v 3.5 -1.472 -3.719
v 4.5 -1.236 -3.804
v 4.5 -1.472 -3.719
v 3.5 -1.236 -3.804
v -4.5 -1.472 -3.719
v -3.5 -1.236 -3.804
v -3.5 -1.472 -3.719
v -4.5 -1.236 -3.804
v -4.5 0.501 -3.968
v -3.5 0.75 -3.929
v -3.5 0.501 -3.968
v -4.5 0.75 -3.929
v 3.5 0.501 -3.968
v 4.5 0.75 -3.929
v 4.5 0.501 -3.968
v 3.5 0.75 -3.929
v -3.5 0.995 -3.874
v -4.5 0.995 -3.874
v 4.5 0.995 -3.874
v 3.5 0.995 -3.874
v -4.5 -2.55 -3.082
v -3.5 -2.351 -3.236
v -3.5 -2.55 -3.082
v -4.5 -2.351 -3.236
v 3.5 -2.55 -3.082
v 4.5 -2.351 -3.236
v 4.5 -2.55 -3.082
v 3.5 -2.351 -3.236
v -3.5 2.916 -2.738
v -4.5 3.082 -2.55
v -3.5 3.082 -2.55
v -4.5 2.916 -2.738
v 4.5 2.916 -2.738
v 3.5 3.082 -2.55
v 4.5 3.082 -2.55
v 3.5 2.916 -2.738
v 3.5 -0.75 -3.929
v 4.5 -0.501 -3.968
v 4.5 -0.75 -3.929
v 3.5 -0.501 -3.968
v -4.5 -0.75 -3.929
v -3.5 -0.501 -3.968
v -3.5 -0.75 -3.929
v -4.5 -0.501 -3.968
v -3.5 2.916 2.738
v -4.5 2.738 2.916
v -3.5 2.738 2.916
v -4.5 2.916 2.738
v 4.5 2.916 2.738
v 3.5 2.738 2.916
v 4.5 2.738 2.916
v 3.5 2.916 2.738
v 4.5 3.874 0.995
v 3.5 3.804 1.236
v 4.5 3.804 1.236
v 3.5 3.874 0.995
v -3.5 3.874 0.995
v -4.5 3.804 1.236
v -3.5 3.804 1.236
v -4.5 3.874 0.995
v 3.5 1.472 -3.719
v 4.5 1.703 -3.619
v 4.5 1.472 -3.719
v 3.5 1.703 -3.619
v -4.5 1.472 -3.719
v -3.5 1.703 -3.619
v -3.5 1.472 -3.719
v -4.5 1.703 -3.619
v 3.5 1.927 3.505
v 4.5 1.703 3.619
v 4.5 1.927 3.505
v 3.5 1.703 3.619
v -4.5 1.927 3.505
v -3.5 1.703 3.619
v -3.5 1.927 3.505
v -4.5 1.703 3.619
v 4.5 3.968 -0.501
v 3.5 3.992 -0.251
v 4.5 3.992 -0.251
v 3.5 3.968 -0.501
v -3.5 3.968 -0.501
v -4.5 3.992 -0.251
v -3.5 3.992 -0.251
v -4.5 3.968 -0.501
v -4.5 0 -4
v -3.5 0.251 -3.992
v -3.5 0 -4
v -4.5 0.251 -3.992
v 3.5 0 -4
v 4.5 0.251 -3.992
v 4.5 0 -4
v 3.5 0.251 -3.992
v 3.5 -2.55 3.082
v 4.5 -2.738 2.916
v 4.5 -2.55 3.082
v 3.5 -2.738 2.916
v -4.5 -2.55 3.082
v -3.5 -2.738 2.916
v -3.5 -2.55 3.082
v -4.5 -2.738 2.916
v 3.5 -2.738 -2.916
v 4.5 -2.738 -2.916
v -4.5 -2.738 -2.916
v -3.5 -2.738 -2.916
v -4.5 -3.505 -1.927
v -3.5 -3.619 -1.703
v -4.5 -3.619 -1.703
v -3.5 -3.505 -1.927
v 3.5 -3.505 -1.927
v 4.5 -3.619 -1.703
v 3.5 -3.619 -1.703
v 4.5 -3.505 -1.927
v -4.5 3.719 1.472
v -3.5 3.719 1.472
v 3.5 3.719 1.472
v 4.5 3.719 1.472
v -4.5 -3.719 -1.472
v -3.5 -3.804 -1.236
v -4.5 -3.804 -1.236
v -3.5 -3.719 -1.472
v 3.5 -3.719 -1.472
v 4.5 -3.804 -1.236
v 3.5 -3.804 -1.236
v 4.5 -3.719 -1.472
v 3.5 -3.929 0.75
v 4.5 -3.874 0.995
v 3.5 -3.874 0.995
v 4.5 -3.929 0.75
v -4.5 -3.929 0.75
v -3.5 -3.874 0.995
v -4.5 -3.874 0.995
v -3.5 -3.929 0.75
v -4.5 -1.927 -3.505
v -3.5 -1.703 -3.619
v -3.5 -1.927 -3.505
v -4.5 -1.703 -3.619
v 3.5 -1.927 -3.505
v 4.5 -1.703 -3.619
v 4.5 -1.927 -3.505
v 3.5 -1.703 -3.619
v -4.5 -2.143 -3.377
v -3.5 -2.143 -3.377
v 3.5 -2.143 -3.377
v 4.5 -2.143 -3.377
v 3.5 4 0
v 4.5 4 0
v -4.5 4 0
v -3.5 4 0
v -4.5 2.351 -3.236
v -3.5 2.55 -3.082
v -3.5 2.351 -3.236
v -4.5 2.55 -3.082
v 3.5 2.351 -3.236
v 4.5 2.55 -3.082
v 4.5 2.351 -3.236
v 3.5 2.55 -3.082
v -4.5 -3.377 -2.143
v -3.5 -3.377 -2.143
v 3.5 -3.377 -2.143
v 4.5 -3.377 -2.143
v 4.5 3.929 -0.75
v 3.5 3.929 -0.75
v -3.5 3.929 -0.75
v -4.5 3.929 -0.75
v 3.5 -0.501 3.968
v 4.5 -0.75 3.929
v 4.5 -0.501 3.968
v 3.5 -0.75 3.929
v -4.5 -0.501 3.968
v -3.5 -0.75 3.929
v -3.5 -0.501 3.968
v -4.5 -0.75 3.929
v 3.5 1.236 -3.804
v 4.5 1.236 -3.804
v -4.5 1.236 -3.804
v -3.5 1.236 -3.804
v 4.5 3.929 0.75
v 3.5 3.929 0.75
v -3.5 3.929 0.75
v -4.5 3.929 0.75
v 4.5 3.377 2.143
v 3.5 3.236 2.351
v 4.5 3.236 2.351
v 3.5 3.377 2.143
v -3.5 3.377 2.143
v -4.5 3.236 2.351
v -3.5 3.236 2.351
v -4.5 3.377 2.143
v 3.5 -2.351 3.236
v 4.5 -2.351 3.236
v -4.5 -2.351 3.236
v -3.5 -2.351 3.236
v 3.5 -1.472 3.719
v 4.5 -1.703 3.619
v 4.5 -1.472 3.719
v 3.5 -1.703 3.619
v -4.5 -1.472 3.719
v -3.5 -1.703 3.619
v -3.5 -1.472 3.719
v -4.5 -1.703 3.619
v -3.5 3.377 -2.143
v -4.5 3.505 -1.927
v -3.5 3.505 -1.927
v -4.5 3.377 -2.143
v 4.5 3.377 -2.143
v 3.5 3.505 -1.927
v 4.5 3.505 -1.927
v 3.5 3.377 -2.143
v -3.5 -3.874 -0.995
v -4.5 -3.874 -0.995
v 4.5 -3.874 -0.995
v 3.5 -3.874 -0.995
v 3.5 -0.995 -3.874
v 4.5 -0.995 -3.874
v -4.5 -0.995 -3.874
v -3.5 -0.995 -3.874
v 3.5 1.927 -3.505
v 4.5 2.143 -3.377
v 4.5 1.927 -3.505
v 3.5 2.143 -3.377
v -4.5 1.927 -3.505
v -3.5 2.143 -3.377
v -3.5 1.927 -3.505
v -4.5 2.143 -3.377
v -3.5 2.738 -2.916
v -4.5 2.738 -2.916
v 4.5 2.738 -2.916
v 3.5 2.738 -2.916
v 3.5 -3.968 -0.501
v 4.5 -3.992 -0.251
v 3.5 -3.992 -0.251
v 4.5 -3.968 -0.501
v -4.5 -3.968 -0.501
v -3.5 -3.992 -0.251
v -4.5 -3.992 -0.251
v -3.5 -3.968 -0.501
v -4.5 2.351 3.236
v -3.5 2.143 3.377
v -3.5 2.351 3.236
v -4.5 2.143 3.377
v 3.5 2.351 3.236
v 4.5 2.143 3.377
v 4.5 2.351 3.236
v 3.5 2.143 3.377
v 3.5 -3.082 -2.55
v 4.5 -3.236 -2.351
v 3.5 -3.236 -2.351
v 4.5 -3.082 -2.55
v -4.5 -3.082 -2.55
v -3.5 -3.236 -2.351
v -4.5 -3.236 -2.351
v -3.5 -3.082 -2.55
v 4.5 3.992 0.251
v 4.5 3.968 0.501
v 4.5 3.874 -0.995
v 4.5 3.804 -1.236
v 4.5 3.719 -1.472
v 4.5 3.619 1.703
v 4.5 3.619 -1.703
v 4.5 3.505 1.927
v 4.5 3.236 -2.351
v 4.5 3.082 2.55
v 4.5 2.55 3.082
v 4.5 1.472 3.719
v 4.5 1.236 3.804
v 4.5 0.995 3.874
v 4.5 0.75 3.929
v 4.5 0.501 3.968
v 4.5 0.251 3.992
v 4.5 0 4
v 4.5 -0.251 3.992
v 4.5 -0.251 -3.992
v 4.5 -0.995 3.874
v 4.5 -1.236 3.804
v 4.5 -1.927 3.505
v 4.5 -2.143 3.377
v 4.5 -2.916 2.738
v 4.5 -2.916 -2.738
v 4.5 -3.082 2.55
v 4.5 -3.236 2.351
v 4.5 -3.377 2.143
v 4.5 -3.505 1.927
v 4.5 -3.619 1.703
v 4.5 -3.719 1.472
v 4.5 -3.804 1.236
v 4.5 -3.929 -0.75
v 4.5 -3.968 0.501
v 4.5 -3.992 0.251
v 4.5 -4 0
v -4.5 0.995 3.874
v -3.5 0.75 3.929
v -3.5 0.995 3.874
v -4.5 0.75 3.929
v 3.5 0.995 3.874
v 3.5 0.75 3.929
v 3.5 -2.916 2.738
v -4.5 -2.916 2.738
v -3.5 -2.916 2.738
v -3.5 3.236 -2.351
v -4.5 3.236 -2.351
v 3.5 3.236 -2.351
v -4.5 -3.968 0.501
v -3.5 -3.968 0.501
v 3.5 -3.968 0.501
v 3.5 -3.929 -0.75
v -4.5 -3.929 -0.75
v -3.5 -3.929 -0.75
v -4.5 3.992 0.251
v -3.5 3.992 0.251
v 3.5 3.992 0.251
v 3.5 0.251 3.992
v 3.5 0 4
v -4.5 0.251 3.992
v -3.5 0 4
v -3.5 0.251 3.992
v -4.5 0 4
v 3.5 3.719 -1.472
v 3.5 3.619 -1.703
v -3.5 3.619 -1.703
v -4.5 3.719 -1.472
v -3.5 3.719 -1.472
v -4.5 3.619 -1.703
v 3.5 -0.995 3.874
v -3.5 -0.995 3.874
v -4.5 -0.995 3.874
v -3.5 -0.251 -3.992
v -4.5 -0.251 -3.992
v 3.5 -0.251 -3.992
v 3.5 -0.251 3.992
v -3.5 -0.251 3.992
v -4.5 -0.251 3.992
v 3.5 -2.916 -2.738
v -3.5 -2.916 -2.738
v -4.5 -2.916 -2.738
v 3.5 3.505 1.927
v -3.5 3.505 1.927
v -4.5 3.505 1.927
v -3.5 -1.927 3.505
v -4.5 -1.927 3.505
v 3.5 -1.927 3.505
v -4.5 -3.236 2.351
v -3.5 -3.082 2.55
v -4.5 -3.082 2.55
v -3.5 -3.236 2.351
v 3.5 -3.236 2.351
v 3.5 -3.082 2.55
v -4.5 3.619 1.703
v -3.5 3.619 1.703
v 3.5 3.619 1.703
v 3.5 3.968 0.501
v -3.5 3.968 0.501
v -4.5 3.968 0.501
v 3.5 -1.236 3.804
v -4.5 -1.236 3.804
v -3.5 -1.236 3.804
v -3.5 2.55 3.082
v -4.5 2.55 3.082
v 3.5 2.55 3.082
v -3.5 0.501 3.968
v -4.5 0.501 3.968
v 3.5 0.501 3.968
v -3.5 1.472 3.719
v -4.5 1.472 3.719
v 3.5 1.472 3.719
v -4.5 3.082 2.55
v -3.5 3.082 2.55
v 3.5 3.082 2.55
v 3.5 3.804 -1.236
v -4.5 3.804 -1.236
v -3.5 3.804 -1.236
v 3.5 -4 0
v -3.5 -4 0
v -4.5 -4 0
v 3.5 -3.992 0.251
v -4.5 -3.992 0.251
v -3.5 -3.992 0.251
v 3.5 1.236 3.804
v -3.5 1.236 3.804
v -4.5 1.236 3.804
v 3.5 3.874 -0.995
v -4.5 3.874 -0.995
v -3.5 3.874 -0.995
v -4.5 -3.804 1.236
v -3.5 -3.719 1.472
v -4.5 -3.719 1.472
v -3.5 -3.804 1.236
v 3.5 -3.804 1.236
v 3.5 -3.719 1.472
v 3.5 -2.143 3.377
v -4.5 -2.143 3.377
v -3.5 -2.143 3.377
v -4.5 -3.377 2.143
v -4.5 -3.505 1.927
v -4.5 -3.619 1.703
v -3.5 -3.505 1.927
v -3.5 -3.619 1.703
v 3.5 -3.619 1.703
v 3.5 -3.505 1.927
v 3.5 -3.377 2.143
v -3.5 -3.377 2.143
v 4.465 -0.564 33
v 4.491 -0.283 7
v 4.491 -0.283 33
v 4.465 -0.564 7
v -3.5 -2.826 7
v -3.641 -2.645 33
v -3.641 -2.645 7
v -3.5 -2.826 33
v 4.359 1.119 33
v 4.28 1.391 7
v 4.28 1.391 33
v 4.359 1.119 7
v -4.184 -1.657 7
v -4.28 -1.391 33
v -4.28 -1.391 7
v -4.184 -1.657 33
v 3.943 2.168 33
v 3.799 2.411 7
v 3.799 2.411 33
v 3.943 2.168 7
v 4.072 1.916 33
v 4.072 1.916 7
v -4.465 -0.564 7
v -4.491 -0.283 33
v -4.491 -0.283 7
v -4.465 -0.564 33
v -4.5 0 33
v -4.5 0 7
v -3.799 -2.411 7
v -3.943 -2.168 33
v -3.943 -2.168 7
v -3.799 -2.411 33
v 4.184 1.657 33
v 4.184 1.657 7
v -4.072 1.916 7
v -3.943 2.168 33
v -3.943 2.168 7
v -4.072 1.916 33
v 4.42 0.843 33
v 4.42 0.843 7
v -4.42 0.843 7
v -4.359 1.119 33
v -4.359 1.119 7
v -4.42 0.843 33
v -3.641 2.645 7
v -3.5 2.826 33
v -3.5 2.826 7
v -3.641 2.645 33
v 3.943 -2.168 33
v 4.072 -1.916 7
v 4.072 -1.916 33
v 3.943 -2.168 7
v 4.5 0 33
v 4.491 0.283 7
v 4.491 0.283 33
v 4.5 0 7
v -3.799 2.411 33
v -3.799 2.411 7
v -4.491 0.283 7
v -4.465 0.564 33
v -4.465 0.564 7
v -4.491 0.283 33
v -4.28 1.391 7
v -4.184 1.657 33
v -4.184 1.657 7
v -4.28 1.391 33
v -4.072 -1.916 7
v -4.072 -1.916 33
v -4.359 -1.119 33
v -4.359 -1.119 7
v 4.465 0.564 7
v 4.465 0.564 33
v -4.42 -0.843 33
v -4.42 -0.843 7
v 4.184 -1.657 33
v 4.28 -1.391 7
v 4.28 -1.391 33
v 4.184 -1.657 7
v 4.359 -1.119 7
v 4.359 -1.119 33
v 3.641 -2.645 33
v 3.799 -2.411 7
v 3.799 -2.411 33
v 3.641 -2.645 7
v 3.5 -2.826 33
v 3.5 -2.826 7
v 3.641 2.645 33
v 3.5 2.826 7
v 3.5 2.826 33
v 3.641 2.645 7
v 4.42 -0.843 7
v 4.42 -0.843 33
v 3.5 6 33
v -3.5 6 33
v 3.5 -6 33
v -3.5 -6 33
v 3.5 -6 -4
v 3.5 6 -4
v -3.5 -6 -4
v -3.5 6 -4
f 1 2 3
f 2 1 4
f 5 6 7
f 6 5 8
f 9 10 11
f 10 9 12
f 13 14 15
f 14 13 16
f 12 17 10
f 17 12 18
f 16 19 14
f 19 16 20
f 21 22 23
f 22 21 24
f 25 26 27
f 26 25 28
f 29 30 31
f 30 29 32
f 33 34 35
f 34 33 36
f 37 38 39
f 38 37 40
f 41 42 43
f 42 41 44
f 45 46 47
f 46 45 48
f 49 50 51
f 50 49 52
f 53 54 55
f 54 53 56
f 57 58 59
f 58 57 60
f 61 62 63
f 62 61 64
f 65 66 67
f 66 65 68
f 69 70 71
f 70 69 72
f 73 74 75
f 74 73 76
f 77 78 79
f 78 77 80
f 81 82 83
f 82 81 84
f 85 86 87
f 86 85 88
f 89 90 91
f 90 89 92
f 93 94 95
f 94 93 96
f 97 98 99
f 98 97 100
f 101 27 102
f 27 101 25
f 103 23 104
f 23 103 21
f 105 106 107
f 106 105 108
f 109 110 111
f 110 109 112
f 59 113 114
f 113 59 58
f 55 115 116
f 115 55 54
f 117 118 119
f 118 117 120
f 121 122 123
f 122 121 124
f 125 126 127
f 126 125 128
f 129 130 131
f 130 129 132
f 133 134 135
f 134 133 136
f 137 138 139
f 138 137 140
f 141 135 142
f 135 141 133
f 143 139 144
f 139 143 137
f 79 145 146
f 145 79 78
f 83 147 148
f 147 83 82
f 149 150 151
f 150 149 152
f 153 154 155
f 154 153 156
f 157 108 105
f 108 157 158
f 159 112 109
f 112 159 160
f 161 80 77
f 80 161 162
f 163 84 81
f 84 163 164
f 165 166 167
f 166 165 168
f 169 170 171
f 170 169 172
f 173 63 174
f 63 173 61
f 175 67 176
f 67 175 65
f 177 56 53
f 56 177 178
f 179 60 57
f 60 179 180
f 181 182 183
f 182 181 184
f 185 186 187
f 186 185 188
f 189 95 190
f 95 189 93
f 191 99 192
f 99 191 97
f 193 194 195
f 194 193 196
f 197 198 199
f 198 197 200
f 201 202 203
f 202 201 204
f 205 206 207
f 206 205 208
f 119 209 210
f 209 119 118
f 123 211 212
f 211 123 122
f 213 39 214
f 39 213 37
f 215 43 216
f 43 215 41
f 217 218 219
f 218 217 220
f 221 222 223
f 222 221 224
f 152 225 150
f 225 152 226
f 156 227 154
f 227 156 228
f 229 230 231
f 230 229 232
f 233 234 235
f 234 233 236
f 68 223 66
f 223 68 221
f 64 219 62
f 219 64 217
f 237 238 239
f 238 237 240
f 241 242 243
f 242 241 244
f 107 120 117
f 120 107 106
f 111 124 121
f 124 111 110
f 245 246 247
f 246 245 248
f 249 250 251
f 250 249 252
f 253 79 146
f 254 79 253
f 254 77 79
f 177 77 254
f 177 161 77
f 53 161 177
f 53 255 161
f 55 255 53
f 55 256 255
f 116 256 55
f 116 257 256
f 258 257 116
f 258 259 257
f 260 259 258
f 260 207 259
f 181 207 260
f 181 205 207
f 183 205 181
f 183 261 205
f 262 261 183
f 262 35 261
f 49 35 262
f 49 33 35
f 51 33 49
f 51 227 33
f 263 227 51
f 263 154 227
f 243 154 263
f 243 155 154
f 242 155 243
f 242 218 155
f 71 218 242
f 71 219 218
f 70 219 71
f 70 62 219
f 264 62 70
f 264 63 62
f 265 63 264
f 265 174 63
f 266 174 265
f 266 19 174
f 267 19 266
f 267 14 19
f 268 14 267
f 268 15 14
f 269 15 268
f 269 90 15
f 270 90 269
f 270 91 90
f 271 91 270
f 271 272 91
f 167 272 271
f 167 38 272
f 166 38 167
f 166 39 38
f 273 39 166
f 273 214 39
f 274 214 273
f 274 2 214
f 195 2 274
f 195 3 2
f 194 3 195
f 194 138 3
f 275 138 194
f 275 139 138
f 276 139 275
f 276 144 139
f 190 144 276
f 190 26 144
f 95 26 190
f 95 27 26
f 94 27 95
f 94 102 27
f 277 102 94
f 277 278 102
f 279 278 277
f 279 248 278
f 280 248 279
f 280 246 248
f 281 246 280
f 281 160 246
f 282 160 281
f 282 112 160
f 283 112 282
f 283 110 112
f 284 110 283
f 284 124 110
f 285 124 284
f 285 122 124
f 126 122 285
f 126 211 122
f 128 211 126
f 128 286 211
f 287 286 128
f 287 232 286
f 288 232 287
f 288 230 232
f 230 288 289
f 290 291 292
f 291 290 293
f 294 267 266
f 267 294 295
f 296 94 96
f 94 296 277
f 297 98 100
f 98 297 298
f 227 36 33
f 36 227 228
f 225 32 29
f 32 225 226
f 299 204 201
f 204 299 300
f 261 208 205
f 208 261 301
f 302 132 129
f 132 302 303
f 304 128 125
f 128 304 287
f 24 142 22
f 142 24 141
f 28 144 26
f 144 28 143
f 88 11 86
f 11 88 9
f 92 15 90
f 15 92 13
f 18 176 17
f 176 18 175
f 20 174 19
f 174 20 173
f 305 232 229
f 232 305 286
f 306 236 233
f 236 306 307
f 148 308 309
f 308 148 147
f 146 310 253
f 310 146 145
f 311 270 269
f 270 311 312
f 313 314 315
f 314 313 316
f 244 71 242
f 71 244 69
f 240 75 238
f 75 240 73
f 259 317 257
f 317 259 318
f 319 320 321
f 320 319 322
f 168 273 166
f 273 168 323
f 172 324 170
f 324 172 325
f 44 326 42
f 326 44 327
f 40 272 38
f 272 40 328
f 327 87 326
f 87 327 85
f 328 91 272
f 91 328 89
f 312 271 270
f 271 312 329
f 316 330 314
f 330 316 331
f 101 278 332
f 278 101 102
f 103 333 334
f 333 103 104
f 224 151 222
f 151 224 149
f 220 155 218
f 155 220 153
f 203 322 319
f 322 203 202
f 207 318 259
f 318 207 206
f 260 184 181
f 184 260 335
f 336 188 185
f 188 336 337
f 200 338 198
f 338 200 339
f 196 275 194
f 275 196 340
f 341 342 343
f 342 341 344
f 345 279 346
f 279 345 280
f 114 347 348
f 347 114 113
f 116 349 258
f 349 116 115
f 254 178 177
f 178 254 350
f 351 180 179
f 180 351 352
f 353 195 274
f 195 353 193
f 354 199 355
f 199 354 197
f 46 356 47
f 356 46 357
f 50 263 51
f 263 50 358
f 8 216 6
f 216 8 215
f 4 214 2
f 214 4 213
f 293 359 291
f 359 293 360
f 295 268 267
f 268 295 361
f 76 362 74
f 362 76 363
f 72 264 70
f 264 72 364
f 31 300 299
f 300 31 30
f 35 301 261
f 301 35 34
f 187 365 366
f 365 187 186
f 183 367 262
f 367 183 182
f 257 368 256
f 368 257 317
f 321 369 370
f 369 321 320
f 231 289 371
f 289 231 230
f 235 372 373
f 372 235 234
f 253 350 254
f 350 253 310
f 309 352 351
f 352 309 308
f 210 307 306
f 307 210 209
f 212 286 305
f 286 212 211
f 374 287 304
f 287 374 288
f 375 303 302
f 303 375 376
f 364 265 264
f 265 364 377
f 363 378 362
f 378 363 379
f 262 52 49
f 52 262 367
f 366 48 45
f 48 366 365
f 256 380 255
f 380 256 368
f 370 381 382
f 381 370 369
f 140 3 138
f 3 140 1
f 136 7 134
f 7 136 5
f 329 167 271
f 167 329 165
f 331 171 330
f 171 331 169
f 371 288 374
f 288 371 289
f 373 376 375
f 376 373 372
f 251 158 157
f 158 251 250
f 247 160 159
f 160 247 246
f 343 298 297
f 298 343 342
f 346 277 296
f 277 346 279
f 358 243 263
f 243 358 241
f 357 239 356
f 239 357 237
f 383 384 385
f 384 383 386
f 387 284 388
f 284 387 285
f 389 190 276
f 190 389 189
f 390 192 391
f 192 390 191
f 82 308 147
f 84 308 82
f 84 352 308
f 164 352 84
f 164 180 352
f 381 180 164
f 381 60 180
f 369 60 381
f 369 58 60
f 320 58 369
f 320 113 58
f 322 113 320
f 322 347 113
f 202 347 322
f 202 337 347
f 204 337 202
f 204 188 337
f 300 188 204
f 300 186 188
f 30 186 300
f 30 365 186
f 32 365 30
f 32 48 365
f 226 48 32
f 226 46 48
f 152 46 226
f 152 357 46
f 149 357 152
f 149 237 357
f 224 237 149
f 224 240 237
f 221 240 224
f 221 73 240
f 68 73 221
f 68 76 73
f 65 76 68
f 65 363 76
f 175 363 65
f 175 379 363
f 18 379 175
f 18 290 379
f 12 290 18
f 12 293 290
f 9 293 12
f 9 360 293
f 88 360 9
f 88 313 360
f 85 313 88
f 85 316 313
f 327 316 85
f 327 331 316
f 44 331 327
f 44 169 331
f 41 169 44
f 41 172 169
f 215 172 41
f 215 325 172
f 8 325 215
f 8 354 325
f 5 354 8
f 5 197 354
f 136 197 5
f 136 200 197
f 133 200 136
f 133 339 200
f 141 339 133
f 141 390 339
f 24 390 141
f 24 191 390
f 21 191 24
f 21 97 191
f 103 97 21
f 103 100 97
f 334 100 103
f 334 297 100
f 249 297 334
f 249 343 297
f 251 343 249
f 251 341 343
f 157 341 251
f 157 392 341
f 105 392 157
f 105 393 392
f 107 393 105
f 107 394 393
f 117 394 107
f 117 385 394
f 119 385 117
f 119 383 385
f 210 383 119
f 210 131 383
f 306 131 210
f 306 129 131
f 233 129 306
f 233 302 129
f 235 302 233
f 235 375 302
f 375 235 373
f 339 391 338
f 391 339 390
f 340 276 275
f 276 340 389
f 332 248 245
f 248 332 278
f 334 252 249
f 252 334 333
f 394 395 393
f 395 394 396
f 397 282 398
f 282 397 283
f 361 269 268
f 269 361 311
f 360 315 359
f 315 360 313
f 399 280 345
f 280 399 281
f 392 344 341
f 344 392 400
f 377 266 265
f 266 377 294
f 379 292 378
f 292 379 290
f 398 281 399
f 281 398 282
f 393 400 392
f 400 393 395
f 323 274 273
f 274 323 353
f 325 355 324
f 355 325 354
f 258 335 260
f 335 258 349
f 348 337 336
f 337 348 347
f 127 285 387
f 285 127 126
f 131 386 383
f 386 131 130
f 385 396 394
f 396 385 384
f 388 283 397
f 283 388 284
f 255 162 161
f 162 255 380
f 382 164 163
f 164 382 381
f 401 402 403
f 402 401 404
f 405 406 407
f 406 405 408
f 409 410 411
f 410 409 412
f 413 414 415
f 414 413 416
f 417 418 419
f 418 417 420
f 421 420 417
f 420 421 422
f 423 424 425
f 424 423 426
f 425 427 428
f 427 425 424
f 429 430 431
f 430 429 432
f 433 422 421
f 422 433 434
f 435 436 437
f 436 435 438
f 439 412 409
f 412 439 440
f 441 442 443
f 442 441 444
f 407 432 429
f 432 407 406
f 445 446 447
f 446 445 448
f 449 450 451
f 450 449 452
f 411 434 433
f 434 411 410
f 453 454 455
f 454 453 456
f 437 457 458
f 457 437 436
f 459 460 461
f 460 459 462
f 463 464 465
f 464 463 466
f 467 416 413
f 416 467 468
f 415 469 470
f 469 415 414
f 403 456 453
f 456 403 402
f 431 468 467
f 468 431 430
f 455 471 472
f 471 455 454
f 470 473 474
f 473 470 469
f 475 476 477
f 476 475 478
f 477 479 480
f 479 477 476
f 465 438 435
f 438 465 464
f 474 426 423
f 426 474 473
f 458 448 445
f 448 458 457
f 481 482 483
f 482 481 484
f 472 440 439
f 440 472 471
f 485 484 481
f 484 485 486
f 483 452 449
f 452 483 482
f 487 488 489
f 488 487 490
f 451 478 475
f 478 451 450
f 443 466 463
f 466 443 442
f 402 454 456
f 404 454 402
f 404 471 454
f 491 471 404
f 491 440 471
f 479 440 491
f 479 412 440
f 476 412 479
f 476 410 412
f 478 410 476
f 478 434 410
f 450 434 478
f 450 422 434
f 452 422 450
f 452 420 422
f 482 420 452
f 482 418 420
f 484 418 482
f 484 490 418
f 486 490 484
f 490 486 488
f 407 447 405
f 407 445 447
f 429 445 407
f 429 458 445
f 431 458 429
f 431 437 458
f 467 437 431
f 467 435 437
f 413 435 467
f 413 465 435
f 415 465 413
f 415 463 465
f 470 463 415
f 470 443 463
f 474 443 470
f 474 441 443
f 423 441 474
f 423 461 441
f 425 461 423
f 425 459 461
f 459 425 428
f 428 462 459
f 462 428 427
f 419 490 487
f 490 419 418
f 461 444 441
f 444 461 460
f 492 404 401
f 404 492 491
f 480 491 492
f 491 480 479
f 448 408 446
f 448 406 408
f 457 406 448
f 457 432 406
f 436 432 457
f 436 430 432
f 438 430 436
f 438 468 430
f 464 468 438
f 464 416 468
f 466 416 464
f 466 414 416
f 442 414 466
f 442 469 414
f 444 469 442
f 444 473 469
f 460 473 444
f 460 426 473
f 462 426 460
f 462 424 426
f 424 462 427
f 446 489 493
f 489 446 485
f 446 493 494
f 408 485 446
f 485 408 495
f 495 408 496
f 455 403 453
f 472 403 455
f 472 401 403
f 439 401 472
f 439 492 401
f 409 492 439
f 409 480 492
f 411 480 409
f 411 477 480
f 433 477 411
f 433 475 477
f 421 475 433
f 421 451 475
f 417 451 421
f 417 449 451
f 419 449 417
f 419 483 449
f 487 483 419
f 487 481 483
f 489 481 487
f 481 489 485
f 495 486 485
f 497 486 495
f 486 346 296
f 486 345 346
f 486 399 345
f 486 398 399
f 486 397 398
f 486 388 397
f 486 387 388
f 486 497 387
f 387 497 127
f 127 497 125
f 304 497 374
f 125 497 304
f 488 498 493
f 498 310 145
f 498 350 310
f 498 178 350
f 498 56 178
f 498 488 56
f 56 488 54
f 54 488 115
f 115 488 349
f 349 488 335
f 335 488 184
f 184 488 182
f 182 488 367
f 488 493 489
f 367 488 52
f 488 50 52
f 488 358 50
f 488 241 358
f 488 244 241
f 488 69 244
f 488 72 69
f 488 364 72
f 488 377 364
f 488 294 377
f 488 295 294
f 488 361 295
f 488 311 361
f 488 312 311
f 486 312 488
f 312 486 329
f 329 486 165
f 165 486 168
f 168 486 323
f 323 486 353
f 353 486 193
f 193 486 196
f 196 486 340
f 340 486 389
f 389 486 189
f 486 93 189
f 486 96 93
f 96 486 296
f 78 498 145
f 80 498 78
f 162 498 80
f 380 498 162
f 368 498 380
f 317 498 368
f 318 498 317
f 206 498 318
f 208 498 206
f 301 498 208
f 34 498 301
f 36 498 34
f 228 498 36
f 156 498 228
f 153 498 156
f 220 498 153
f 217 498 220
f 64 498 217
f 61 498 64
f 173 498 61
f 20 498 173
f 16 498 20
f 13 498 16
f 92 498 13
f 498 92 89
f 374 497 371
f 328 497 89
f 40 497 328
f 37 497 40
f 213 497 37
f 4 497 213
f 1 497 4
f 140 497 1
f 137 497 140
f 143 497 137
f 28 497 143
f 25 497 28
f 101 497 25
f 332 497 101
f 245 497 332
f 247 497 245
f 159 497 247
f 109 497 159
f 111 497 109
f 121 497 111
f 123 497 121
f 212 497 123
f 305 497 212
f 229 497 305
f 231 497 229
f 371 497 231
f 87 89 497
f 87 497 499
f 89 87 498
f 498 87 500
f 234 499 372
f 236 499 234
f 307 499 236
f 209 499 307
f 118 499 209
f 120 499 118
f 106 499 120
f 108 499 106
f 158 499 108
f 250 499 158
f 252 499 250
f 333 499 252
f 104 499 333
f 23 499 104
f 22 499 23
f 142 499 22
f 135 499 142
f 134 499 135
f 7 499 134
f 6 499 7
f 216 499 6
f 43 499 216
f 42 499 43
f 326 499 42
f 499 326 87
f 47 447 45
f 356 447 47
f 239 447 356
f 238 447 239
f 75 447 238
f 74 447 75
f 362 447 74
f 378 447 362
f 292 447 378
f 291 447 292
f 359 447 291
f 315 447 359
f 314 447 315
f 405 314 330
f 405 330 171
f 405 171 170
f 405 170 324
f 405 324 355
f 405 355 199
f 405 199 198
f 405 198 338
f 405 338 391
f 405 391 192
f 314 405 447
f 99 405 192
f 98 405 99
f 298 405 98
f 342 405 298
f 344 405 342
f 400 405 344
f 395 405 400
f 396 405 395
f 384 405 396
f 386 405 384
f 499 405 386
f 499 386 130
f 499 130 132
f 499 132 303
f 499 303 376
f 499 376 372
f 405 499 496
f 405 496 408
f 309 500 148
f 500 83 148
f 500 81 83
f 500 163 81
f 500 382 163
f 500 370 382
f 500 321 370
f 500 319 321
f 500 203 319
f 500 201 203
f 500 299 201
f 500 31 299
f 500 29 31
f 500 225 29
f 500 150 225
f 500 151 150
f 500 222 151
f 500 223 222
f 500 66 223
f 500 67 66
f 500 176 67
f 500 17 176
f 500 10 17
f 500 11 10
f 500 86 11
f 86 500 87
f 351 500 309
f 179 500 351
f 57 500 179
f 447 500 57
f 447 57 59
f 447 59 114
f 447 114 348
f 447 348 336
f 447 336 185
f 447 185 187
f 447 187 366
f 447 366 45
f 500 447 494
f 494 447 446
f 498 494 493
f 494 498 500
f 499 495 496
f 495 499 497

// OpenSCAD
translate([0,-7,-7]){


        difference(){
            union(){

                translate([-4.5,7,7]){
                    rotate([0,90,0]){
                        cylinder(h=9, r=4.0, $fn=100, center=false);
                    }
                }  


                translate([0,7,14]){
                    rotate([0,0,90]){
                        cylinder(h=40-14, r=4.5, $fn=100, center=false);
                    }
                }  



                translate([-3.5,1,3]){
                    cube([7,12,37], center=false);
                }

            }
            union() {



            }
        }
}
